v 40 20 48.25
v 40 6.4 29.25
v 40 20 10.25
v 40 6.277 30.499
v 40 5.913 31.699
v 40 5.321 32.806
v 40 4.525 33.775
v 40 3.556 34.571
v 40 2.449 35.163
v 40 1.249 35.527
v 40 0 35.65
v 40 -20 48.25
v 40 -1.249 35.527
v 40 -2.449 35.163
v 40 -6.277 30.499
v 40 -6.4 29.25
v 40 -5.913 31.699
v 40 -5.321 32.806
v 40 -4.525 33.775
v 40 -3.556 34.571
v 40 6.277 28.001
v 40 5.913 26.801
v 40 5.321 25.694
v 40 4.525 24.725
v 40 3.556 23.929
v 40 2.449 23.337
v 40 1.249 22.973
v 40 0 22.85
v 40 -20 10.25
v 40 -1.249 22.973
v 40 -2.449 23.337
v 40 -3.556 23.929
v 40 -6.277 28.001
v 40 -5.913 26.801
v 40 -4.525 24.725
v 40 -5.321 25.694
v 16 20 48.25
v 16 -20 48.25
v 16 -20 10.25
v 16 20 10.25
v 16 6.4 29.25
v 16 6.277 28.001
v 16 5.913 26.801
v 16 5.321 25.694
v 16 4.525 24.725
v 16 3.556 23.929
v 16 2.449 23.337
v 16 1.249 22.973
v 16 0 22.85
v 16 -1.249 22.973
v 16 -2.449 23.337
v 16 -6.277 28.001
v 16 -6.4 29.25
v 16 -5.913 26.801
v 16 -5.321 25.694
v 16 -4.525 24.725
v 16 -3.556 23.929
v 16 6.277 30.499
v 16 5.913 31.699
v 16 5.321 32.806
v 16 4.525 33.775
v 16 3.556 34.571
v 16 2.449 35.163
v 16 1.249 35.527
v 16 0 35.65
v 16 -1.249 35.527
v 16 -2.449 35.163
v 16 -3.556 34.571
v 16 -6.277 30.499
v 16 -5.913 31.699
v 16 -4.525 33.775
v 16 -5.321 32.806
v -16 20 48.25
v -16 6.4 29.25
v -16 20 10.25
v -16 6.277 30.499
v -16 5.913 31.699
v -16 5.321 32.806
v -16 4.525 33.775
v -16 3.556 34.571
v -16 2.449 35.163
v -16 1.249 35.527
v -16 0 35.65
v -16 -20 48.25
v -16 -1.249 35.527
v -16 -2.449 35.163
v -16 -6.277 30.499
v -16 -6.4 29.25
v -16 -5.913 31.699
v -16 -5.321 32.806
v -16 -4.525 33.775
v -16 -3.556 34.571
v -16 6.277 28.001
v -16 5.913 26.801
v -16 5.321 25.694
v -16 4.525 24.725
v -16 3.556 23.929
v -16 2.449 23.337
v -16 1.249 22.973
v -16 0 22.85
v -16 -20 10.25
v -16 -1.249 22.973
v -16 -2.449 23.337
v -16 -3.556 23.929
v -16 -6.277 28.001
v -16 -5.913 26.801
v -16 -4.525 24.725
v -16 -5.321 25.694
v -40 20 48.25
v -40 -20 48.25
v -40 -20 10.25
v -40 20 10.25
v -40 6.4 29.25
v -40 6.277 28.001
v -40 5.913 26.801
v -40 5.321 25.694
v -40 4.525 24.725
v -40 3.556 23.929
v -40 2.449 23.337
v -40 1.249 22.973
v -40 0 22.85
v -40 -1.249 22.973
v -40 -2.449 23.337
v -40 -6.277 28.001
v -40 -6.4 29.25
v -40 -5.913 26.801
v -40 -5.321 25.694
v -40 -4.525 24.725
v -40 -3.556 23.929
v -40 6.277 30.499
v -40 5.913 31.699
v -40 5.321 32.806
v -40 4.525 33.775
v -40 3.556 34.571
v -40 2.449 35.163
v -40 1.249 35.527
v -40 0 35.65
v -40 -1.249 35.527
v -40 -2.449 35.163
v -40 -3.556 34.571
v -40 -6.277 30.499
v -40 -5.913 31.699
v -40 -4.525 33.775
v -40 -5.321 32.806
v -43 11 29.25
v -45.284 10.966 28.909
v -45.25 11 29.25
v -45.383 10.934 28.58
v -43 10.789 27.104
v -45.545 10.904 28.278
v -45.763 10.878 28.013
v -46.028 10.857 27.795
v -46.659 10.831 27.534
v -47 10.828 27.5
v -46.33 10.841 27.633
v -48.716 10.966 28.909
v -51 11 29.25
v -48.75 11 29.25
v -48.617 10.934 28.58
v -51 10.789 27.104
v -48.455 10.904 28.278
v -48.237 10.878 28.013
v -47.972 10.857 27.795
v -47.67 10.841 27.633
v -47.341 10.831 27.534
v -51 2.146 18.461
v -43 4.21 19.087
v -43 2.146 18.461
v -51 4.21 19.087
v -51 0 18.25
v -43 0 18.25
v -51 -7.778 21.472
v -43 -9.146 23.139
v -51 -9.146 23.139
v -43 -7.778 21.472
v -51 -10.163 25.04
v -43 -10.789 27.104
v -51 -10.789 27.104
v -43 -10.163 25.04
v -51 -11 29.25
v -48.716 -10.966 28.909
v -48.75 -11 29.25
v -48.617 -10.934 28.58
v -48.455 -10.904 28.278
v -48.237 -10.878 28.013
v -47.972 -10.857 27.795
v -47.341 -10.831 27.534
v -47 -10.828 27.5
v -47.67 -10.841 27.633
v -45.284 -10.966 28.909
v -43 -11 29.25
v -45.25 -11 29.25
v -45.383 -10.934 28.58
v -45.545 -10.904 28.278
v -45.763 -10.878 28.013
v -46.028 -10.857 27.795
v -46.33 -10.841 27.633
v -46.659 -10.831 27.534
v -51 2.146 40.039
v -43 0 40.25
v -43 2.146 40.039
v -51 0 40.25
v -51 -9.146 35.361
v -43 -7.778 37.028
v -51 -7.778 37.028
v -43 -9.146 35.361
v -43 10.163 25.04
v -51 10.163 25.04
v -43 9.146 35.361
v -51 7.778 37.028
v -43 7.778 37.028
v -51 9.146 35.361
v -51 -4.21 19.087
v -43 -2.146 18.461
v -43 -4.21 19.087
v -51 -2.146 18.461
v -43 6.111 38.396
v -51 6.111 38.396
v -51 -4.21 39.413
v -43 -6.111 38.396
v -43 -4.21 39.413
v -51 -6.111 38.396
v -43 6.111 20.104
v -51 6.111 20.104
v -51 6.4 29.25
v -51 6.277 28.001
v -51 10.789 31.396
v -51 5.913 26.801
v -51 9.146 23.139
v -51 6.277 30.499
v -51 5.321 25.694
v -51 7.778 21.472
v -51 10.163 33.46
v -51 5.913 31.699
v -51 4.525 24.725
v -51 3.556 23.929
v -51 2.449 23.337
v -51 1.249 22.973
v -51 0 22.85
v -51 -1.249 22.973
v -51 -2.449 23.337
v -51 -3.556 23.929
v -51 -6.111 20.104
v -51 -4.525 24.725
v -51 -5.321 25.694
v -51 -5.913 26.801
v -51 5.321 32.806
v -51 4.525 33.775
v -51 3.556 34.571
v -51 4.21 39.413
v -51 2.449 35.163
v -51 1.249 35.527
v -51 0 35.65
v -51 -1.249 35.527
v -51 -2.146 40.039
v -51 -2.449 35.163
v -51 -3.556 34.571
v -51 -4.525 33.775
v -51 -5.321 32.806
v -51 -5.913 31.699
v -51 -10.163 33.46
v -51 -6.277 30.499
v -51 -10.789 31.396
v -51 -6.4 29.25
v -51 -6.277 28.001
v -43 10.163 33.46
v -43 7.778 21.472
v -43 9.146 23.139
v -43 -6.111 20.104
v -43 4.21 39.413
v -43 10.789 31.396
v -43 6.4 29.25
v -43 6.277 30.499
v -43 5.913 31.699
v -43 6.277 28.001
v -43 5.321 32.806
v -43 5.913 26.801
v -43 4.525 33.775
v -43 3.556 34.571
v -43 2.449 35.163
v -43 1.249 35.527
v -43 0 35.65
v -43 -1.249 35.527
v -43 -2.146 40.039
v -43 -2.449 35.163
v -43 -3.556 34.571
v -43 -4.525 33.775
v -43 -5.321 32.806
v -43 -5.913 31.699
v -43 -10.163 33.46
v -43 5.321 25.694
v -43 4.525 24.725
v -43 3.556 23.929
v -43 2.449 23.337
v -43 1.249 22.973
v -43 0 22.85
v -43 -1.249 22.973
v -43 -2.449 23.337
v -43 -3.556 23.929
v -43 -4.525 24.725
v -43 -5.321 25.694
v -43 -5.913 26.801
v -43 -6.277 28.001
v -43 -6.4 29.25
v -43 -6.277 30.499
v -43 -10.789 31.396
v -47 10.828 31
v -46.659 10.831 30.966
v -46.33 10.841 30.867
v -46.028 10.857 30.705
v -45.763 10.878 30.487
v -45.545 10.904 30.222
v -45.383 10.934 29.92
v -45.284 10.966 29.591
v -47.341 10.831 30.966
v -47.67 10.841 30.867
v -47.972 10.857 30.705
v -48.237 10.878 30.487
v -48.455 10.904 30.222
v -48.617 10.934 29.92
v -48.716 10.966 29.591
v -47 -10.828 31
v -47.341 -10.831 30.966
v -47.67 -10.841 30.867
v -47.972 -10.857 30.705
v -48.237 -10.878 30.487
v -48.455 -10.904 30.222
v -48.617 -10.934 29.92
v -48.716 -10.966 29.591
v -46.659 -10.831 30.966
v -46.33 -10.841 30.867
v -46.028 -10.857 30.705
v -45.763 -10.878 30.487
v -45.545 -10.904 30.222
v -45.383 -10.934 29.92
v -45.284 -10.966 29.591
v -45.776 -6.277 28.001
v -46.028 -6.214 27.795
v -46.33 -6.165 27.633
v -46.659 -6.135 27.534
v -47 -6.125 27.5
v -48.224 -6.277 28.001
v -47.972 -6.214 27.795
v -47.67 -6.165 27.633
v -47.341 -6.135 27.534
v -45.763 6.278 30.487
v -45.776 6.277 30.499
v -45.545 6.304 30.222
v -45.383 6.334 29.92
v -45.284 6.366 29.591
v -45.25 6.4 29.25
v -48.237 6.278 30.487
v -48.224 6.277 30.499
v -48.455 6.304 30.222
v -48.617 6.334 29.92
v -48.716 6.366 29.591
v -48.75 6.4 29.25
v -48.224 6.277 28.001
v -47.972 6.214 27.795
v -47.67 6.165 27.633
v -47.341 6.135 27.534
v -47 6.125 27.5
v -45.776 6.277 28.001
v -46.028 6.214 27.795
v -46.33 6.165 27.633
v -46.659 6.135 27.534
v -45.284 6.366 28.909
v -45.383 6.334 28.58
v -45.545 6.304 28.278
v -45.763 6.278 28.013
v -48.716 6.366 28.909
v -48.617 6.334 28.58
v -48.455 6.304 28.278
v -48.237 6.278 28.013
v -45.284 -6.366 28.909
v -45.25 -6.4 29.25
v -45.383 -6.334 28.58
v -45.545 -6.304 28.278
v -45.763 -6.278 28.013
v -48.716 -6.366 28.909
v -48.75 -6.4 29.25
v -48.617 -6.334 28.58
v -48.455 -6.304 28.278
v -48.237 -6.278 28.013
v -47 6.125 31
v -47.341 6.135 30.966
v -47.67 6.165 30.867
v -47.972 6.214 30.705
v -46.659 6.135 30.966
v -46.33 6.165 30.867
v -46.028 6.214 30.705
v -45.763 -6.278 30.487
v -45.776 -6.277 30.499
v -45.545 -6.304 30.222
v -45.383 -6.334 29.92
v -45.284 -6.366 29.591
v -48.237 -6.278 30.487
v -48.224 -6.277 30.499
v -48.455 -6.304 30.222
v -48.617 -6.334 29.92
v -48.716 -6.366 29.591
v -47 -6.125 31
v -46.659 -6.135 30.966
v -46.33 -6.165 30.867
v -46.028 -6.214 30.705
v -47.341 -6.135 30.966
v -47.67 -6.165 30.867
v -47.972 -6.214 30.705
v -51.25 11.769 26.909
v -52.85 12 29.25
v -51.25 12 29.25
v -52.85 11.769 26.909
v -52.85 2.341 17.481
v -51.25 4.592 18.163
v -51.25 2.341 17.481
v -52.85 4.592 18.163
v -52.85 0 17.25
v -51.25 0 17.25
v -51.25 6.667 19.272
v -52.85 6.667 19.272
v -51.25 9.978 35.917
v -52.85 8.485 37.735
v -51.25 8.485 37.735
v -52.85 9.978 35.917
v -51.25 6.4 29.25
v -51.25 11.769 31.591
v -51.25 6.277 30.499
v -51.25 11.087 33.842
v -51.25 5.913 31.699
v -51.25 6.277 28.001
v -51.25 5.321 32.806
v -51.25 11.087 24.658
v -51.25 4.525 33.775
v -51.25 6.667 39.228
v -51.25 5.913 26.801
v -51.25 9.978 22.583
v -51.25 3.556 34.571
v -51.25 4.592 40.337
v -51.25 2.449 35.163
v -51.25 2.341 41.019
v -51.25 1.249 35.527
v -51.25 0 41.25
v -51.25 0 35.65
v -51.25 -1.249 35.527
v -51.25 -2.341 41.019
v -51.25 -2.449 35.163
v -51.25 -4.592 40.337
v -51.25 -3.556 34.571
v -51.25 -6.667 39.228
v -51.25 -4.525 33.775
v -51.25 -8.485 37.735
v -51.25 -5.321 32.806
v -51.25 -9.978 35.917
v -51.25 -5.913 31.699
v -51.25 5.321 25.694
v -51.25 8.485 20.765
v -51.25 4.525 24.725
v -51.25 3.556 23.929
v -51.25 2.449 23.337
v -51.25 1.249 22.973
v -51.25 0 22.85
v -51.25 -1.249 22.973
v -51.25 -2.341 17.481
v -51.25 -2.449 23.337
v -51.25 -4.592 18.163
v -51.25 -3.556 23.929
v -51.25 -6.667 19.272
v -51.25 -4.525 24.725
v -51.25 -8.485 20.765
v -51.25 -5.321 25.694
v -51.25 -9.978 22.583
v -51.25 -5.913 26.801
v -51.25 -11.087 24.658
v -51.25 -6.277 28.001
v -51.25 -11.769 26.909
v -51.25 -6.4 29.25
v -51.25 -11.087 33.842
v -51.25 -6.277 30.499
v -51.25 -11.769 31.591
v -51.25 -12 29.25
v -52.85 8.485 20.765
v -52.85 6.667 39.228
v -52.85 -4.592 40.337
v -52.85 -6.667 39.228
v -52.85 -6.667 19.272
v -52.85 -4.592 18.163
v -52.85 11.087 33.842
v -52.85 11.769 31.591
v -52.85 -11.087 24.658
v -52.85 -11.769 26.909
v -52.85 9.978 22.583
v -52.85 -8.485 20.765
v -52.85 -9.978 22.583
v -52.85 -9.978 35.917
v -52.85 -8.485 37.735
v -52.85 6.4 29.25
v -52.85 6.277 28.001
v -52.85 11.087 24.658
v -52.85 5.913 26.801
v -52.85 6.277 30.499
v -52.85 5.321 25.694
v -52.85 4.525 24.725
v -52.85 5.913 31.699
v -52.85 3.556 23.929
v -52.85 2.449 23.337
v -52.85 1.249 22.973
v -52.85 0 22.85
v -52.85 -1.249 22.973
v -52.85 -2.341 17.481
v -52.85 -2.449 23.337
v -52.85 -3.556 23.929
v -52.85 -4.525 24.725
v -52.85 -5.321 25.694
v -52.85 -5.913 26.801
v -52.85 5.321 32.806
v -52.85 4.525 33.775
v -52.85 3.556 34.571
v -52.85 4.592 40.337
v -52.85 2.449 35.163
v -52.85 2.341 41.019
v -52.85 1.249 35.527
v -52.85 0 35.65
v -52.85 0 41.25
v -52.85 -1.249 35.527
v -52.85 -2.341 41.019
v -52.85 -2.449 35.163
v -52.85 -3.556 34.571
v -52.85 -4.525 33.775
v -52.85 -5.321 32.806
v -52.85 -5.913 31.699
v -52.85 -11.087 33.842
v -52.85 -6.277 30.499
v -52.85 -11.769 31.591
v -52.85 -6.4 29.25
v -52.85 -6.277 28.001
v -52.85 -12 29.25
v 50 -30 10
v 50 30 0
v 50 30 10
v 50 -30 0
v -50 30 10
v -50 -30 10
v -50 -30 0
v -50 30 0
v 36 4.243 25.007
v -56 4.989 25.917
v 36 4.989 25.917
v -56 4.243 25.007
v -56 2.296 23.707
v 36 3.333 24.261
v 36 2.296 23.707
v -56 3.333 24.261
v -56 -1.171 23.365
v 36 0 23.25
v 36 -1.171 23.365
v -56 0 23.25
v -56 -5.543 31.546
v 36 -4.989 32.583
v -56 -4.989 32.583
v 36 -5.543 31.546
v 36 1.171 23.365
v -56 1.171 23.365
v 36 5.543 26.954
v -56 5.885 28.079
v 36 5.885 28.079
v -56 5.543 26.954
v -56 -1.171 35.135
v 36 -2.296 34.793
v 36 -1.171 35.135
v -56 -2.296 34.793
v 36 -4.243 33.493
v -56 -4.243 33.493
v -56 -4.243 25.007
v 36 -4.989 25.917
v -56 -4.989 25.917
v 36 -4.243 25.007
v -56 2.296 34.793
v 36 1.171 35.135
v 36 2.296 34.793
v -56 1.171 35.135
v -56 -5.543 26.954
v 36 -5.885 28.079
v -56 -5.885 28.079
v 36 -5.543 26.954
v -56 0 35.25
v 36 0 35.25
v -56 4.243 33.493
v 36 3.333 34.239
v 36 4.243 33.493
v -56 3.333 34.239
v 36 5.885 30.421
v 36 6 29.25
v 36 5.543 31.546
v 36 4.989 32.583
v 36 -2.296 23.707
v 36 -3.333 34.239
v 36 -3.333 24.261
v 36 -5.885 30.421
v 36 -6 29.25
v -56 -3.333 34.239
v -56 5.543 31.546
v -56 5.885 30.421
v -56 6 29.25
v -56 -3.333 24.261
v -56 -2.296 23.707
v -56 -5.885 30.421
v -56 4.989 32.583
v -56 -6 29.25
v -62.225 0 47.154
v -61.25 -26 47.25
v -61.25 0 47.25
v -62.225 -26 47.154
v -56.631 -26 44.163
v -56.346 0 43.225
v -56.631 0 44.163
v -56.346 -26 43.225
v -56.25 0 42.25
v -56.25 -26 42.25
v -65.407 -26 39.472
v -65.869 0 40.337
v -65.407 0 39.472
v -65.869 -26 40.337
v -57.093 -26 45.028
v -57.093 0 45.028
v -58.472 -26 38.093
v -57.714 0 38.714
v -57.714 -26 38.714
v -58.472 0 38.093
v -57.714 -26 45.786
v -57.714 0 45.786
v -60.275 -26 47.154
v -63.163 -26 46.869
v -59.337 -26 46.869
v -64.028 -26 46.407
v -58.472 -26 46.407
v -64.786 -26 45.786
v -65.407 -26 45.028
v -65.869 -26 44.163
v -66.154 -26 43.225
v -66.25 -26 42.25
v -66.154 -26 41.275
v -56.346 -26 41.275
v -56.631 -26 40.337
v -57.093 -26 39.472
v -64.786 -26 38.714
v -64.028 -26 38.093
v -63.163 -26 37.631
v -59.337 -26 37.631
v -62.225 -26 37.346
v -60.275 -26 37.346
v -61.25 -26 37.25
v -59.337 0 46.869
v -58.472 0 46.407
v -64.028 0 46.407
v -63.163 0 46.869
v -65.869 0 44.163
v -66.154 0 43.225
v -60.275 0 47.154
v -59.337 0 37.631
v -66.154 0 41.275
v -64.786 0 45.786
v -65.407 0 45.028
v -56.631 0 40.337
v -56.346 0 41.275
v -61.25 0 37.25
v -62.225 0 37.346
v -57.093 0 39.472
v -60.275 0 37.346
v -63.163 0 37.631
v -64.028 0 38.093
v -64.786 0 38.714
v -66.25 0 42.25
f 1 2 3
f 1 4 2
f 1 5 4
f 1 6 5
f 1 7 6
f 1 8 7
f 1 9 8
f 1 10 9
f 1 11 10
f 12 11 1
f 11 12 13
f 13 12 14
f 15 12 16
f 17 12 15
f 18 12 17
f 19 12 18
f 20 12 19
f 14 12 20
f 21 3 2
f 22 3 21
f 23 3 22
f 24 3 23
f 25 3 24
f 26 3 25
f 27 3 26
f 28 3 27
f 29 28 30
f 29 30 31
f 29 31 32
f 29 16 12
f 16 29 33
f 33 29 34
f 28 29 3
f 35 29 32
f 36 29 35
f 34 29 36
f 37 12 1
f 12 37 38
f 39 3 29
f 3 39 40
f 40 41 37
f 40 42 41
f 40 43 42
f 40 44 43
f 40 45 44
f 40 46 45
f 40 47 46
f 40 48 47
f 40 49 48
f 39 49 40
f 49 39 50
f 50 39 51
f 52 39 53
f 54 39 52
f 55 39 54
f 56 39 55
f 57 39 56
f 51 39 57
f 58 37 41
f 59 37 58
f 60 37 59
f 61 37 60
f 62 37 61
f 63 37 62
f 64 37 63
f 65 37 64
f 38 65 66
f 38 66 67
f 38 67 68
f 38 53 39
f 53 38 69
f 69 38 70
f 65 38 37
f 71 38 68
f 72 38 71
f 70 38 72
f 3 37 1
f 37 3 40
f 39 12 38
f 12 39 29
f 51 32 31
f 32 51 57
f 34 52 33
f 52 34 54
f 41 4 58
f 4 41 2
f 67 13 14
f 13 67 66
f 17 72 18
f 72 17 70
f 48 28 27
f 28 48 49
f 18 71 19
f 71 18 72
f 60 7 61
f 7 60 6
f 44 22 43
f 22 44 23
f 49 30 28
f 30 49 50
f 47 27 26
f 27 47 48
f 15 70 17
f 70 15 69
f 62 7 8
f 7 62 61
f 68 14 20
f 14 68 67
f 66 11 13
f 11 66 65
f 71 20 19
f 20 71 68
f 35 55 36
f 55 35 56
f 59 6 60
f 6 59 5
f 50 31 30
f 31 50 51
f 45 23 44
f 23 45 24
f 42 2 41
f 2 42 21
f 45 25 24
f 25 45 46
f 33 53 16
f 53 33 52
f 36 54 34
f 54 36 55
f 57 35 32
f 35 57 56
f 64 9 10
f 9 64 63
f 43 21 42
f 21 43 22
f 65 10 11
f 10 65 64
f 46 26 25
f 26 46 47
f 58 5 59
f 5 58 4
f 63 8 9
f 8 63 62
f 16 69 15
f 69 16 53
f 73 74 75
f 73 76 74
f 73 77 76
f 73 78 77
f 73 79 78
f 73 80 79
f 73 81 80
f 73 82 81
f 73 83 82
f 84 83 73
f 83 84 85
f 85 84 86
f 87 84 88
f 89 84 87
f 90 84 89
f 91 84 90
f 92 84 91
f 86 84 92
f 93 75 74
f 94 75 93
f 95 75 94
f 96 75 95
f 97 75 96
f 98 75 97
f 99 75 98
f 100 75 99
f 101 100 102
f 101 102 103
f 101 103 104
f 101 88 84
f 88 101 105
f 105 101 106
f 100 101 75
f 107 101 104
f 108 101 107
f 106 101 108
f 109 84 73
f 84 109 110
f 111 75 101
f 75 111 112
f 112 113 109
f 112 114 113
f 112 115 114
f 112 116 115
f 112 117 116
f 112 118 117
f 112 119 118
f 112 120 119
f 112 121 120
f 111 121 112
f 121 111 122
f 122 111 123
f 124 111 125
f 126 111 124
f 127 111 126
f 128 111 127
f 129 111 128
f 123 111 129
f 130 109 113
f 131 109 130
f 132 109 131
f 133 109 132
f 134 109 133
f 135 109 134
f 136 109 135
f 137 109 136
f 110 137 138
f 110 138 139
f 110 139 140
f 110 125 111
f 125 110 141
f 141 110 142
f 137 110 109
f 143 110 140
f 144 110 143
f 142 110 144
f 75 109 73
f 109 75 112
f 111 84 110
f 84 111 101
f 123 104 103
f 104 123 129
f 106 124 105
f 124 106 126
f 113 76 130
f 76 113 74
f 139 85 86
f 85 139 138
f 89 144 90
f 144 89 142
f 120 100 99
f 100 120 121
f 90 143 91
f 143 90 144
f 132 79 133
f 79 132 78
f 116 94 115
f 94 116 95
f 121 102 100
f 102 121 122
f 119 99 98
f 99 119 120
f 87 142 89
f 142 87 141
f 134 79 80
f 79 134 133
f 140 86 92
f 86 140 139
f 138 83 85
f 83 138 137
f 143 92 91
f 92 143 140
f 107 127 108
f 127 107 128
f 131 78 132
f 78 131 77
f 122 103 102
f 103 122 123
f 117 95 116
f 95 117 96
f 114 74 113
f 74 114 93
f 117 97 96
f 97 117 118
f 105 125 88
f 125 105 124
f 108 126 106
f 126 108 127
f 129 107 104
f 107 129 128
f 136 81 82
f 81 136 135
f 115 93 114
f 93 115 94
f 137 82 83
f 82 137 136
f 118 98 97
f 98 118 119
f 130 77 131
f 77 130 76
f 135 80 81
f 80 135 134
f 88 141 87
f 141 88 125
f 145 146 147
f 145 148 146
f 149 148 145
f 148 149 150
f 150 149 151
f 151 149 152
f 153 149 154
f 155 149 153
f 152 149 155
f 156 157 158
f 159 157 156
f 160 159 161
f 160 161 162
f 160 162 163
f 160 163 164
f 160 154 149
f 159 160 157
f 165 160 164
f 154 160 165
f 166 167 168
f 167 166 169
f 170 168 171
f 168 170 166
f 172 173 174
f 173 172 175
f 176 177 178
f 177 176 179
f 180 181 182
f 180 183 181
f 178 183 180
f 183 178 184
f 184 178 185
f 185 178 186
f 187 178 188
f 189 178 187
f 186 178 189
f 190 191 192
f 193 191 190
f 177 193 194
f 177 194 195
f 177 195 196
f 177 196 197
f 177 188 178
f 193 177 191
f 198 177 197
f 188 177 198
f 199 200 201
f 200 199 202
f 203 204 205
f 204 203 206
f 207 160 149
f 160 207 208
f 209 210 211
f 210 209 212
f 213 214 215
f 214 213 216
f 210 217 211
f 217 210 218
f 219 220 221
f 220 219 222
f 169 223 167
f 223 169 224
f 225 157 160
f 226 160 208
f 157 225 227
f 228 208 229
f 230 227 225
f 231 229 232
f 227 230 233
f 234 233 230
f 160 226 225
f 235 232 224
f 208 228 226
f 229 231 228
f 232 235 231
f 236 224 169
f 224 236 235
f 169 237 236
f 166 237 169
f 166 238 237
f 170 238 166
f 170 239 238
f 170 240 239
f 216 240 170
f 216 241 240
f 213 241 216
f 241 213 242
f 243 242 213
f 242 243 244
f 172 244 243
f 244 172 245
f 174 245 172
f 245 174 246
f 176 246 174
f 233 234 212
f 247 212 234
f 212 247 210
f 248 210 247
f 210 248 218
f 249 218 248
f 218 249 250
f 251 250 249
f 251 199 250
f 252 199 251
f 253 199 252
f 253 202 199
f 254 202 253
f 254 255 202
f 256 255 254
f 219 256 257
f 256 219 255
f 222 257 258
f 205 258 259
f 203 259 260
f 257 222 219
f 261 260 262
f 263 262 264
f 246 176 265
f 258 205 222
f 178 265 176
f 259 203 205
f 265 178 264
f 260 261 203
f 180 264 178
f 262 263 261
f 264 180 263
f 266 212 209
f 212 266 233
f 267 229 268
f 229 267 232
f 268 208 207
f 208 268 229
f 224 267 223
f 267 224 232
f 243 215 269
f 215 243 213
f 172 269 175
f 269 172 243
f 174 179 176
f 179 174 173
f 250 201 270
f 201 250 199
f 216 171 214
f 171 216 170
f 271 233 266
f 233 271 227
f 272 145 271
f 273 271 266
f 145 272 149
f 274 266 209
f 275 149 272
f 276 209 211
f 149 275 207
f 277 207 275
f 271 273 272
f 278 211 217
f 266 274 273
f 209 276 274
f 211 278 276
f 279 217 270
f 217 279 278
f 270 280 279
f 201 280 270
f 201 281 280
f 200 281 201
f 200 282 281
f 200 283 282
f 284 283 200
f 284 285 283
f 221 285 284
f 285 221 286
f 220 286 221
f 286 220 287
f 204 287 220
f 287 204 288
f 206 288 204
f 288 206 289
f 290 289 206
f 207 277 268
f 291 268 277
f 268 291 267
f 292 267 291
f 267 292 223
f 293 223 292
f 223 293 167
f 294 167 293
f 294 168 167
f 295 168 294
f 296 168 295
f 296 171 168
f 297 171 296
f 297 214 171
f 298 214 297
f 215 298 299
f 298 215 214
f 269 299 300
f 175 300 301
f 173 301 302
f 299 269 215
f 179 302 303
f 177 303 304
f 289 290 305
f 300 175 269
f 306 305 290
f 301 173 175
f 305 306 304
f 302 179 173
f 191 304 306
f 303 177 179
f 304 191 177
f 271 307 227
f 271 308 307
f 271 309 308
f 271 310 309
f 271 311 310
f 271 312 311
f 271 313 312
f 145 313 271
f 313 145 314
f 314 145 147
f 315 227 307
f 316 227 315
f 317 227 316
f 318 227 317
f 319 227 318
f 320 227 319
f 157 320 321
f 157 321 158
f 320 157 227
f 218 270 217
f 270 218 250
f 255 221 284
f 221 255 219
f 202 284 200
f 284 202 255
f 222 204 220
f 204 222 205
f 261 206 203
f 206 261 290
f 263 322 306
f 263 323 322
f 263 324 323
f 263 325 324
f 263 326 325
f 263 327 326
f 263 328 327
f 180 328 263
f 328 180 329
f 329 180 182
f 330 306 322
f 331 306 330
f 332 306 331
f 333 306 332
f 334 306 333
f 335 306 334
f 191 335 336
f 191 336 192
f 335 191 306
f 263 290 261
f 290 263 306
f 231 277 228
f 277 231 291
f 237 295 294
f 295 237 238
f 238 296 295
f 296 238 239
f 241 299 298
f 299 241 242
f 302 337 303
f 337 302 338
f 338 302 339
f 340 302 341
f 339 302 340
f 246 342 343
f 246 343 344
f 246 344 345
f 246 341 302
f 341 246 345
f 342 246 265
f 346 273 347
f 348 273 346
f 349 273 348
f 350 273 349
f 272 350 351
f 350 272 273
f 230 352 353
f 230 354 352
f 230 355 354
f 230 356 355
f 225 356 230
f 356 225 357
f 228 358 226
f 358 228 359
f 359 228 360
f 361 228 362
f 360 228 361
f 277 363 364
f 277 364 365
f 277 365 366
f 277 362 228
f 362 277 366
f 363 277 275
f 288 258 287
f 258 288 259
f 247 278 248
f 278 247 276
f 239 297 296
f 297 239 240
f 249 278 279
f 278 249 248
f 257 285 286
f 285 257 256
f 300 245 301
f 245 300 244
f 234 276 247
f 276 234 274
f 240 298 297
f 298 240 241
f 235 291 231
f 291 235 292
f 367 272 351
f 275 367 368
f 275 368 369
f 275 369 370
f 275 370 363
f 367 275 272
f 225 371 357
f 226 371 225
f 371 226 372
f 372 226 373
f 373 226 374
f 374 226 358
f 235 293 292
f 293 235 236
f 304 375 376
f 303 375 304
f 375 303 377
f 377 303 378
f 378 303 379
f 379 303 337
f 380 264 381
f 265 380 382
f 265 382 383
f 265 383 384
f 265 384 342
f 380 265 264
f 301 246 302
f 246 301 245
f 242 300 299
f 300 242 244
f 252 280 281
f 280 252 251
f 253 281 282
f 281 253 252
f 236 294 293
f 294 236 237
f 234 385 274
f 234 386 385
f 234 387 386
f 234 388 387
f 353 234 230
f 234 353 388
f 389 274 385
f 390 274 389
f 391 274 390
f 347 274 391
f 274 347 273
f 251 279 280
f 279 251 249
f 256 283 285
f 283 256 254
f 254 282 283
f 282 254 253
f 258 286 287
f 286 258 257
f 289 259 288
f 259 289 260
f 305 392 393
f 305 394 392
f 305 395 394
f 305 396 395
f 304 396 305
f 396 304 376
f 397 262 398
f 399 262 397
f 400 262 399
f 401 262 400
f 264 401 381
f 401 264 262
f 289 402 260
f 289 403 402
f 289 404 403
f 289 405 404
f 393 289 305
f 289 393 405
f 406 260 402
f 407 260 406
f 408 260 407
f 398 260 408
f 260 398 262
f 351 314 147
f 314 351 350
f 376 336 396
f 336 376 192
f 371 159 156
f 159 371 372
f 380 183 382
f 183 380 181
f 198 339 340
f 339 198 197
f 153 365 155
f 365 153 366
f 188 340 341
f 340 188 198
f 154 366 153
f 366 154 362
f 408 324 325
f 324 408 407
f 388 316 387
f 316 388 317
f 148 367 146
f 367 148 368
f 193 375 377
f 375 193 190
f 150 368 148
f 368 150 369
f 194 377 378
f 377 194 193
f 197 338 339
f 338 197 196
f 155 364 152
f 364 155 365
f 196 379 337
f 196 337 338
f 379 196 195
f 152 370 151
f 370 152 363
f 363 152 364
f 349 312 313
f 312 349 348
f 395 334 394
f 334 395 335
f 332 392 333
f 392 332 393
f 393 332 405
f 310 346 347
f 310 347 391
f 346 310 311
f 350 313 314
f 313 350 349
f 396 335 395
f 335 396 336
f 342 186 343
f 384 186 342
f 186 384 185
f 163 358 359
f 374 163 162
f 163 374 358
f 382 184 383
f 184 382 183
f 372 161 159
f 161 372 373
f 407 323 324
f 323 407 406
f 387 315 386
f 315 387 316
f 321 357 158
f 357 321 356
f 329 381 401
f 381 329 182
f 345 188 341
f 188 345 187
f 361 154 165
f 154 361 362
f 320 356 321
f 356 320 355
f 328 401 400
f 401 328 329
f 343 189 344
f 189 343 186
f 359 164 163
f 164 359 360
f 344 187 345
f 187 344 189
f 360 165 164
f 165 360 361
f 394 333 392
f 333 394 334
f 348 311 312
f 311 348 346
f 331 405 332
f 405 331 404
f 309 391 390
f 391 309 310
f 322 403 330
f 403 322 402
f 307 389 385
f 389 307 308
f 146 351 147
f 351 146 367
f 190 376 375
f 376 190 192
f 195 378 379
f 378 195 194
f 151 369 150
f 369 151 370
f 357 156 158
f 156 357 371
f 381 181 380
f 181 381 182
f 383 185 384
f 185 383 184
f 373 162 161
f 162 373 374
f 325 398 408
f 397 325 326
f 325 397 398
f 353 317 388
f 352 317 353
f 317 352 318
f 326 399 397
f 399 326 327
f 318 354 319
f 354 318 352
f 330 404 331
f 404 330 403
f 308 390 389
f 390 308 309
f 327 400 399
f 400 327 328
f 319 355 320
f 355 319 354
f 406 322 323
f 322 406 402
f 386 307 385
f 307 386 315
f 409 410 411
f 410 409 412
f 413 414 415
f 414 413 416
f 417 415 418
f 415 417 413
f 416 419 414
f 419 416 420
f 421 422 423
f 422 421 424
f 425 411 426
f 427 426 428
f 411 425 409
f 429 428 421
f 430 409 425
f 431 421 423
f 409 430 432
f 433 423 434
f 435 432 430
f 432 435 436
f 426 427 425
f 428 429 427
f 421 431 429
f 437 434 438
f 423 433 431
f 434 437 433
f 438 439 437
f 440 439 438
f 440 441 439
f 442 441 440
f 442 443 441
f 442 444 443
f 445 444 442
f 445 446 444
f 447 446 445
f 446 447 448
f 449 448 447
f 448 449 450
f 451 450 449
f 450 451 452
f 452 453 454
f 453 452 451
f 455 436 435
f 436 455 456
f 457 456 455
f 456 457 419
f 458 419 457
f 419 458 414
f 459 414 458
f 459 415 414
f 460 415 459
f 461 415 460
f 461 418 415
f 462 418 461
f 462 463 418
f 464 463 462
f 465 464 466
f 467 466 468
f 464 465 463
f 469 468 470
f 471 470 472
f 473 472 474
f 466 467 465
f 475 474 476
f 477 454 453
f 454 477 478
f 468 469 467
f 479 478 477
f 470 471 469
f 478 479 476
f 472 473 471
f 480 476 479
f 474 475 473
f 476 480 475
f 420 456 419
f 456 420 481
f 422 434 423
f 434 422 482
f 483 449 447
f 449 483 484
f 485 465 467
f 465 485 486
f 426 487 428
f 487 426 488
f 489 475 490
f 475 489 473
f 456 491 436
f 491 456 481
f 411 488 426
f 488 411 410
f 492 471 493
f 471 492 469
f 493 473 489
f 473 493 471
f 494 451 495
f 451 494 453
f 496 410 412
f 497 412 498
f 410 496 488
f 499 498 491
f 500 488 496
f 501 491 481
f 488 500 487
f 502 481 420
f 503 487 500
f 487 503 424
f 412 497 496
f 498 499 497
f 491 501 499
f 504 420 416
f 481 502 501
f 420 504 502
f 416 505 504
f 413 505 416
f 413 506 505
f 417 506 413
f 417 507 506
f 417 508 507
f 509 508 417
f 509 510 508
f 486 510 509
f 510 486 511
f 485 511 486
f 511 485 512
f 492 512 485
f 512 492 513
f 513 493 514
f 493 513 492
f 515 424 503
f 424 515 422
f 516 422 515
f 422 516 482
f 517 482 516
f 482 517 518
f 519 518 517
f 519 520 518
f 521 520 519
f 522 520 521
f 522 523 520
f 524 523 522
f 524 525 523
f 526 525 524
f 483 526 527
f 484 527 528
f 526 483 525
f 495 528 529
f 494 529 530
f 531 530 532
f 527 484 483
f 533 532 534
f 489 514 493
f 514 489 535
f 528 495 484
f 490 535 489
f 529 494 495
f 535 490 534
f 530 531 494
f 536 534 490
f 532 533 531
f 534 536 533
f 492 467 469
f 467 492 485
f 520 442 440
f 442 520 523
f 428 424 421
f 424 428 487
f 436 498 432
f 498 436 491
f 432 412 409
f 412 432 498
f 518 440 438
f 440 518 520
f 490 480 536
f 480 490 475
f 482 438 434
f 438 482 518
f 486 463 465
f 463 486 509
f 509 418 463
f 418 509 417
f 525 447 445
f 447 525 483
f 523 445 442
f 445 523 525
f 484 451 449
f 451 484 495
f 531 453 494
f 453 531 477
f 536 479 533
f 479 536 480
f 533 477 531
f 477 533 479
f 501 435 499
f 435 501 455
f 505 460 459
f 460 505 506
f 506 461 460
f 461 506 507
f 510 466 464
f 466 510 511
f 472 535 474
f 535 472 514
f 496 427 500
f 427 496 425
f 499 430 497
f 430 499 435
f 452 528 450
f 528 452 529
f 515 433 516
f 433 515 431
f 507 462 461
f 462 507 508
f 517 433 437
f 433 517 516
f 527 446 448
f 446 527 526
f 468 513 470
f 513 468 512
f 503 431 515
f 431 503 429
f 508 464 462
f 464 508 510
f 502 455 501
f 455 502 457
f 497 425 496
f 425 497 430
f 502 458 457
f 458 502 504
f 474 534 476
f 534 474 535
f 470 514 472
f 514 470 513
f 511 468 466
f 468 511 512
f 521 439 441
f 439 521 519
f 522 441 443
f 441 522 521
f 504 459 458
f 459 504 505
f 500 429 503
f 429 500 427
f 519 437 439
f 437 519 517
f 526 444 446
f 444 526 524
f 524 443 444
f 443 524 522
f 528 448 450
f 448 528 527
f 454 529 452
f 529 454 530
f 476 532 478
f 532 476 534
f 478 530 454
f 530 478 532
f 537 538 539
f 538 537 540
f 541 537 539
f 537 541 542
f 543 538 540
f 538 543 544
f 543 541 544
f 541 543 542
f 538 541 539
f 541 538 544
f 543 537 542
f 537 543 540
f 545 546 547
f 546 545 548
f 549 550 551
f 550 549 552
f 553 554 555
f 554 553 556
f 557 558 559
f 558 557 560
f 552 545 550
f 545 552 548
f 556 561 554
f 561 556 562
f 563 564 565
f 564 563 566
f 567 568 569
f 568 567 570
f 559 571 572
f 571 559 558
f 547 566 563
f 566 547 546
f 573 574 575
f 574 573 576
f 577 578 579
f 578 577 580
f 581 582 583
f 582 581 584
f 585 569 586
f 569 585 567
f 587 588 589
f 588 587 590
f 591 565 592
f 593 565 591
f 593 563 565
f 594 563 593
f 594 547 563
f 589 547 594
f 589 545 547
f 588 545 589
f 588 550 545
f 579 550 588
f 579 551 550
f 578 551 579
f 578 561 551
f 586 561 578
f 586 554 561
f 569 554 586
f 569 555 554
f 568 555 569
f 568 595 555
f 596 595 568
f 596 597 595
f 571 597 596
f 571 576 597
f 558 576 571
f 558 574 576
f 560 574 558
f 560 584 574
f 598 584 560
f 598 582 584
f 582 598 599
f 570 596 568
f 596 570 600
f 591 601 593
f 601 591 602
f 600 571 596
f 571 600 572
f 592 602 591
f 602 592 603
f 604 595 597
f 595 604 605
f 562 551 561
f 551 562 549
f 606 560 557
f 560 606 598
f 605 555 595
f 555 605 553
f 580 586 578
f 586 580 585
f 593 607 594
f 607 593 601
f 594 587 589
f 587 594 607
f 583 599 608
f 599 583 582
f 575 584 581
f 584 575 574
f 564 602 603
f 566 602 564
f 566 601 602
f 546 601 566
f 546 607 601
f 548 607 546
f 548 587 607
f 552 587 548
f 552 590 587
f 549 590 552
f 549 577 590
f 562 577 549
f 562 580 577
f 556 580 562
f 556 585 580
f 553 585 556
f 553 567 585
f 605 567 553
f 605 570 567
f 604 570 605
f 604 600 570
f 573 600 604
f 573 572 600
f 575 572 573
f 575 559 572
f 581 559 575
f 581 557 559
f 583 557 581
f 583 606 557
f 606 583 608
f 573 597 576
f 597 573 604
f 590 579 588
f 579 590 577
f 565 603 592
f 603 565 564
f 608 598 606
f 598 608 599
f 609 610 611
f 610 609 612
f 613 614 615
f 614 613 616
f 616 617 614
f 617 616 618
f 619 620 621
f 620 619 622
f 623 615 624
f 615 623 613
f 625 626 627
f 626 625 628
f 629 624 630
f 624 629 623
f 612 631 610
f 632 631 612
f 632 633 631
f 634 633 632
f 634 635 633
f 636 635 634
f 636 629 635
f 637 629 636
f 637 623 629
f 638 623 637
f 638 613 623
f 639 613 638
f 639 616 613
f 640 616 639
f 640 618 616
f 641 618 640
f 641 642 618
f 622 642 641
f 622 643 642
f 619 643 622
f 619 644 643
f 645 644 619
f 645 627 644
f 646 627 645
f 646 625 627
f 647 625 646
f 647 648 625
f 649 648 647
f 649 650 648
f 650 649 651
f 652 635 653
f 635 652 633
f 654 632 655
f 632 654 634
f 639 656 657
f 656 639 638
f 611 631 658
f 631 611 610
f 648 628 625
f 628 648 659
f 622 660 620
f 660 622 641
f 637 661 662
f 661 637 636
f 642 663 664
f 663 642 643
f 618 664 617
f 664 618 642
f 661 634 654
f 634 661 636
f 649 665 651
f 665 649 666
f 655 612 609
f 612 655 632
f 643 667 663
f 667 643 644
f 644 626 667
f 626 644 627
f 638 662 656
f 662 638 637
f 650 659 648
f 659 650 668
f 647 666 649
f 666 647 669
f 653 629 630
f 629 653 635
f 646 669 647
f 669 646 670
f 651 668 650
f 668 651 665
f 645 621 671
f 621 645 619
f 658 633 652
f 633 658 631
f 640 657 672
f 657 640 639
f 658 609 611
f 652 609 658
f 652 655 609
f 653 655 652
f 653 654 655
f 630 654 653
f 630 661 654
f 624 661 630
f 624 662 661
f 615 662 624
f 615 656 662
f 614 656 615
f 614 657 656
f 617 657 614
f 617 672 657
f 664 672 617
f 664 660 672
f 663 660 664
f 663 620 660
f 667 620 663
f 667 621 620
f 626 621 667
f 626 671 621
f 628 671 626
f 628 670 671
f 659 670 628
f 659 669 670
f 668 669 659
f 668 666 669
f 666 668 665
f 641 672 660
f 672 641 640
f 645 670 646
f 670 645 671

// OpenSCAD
$fn = 32;

// ------------------------------------------------------------------------
// Machine vise: screw d12, jaws 24 x 38 mm
// Every part is its own module, assembly() places every instance.
// ------------------------------------------------------------------------

// --- part 1 ---
module vise_bed() {
  difference() {
    translate([-50, -30, 0]) cube([100, 60, 10]);
  }
}

// --- part 2 ---
module vise_jaw() {
  difference() {
    translate([-12, -20, 0]) cube([24, 40, 38]);
    translate([0, 0, 19]) rotate([0, 90, 0]) cylinder(h = 26, d = 12.8, center = true);
  }
}

// --- part 3 ---
module vise_screw() {
  translate([0, 0, -46]) cylinder(h = 92, d = 12);
}

// --- part 4 ---
module screw_collar() {
  difference() {
    cylinder(h = 8, d = 22);
    translate([0, 0, -1]) cylinder(h = 10, d = 12.8);
    translate([0, 0, 4]) rotate([90, 0, 0]) cylinder(h = 24, d = 3.5, center = true);
  }
}

// --- part 5 ---
module screw_washer() {
  difference() {
      translate([0, 0, 0]) cylinder(h = 1.6, d = 24);
      translate([0, 0, -1]) cylinder(h = 3.6, d = 12.8);
    }
}

// --- part 6 ---
module vise_handle() {
  cylinder(h = 26, d = 10);
}

// --- assembly ---
module assembly() {
  color([0.80, 0.24, 0.20]) translate([0, 0, 0]) rotate([0, 0, 0]) vise_bed();
  color([0.20, 0.45, 0.75]) translate([28, 0, 10.25]) rotate([0, 0, 0]) vise_jaw();
  color([0.25, 0.62, 0.32]) translate([-28, 0, 10.25]) rotate([0, 0, 0]) vise_jaw();
  color([0.92, 0.70, 0.18]) translate([-10, 0, 29.25]) rotate([0, 90, 0]) vise_screw();
  color([0.58, 0.35, 0.70]) translate([-51, 0, 29.25]) rotate([0, 90, 0]) screw_collar();
  color([0.16, 0.66, 0.66]) translate([-52.85, 0, 29.25]) rotate([0, 90, 0]) screw_washer();
  color([0.85, 0.48, 0.18]) translate([-61.25, 0, 42.25]) rotate([90, 0, 0]) vise_handle();
}

assembly();
